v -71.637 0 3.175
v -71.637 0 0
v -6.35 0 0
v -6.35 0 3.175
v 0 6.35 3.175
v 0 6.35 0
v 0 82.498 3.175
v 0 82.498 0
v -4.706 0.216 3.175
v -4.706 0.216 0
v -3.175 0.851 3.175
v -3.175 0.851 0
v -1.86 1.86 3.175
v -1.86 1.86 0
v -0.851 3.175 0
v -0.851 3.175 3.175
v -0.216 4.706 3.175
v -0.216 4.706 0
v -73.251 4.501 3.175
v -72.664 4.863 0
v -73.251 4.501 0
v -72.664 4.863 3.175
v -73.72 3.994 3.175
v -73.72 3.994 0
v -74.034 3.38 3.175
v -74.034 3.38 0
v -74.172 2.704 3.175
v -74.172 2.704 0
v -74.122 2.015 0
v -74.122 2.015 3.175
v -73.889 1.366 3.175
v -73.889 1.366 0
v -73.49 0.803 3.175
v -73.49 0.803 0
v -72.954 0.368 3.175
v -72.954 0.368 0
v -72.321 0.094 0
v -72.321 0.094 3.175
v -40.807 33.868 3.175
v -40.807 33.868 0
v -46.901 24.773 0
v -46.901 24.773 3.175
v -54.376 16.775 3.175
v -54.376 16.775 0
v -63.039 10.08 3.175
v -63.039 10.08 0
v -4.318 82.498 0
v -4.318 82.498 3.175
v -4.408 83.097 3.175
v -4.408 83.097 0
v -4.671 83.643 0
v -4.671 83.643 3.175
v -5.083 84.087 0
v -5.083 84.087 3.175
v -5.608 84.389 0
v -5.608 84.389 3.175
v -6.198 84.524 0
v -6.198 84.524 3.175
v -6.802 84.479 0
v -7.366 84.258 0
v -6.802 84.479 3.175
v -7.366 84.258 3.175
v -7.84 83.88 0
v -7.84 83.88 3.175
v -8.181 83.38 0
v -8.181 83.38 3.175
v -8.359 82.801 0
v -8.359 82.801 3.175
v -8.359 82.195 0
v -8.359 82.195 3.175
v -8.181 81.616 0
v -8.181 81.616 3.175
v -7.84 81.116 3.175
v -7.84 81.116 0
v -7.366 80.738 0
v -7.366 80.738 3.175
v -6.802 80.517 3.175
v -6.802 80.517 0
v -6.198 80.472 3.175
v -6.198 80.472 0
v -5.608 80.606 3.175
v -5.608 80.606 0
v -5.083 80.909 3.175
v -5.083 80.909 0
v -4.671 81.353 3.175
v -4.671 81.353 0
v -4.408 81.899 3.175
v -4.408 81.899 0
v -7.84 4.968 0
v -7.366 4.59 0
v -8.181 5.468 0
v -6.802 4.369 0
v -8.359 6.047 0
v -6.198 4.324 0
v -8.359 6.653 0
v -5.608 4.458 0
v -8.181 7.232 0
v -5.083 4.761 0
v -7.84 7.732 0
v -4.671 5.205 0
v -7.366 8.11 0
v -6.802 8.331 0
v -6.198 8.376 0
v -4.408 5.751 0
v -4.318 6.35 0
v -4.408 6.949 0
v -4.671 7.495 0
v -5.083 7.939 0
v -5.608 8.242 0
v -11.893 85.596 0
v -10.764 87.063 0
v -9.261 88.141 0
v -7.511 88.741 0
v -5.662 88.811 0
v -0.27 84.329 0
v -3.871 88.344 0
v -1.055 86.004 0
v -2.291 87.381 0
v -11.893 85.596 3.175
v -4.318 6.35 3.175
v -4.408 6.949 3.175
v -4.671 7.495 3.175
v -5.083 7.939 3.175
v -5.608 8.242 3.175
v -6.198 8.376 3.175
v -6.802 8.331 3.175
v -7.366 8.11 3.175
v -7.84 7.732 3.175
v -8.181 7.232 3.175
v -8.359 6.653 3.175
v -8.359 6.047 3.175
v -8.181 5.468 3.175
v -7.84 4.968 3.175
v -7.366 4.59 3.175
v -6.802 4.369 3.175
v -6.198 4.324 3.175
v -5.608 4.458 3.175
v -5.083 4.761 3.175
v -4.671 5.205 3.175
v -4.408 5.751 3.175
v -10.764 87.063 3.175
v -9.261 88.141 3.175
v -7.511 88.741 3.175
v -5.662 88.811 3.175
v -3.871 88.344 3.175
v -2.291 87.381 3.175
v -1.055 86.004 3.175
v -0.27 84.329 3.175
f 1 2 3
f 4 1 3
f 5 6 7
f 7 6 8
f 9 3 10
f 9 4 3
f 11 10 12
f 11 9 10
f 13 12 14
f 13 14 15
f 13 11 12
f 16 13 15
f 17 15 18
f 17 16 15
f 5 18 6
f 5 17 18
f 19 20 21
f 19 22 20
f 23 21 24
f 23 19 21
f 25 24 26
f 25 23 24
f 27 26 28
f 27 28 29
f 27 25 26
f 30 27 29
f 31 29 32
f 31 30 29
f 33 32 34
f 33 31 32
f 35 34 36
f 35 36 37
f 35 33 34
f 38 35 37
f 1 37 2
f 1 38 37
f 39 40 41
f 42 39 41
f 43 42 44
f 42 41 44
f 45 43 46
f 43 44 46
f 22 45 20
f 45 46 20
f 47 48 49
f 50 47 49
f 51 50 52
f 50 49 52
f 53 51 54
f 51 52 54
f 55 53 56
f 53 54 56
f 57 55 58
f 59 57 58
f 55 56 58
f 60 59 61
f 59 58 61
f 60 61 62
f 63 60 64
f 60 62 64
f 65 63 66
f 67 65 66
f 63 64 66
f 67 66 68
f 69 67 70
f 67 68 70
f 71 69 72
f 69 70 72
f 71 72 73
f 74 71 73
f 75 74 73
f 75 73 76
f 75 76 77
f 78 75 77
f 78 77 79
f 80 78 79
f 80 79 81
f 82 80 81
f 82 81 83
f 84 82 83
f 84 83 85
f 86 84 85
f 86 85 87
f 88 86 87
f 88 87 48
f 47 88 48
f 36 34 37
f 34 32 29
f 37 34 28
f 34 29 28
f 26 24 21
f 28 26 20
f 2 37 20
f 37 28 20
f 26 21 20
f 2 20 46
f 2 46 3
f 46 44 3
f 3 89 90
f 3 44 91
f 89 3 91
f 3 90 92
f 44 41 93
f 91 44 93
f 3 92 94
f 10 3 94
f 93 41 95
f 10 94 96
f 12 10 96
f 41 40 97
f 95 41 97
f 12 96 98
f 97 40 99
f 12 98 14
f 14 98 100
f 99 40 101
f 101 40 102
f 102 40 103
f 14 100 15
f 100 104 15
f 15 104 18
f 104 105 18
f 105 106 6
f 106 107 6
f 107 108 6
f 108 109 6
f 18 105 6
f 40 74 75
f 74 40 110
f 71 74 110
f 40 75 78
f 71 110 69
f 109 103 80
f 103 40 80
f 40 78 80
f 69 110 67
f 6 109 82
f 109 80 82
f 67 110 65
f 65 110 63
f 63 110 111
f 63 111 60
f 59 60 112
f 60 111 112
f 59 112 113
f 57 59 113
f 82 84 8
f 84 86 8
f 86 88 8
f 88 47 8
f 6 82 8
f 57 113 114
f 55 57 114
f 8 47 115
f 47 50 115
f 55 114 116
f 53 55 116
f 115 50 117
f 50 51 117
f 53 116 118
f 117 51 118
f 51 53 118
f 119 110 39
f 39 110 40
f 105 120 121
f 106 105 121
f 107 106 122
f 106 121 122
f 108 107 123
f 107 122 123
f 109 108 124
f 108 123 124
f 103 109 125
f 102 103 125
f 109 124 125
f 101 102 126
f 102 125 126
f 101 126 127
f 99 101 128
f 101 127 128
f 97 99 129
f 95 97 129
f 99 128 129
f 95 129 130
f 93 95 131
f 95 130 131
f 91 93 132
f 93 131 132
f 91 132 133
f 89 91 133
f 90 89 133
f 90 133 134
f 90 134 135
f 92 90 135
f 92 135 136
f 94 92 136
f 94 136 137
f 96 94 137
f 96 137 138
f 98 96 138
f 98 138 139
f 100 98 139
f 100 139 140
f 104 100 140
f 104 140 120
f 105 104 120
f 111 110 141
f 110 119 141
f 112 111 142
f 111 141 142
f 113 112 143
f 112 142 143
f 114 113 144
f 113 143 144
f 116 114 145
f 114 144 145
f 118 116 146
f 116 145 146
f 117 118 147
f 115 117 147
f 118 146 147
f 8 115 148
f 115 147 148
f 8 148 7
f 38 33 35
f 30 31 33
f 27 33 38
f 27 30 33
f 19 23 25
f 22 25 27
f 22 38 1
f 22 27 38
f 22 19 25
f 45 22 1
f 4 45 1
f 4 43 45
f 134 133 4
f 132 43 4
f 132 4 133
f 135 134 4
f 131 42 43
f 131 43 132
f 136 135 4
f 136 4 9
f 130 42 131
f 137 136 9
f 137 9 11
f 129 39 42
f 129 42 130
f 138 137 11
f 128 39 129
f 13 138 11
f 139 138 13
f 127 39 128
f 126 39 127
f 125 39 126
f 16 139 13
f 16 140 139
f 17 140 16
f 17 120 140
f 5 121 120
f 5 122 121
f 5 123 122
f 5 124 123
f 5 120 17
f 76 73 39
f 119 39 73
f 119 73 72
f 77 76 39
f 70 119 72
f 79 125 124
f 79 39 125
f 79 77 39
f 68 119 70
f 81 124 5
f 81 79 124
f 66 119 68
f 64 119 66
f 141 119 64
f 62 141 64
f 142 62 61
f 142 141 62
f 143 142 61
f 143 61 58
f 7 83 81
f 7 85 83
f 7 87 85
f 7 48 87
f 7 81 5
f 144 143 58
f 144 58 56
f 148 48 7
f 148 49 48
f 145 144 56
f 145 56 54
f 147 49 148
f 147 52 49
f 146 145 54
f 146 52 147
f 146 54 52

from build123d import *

# Parameters (mm, degrees)
BOSS_EXTRUDE1_DEPTH = 3.175
FILLET1_R           = 2.54
FILLET2_R           = 6.35
SKETCH2_R           = 2.032
CUT_EXTRUDE1_DEPTH  = 116.785553087


with BuildPart() as part:
    # Sketch1 → Boss-Extrude1 (new body)
    with BuildSketch(Plane.XY):
        with BuildLine():
            Line((0, 0), (0, 106.872811366))
            Line((0, 106.872811366), (-40.80699964, 33.868121814))
            ThreePointArc((-40.80699964, 33.868121814), (-60.999593642, 11.461483708), (-88.9, 0))
            Line((-88.9, 0), (0, 0))
        make_face()
    extrude(amount=BOSS_EXTRUDE1_DEPTH)

    # Fillet1
    fillet1_edges = [part.edges().sort_by_distance(p)[0] for p in [
        (-88.9, 0, 1.5875),
    ]]
    fillet(fillet1_edges, radius=FILLET1_R)

    # Fillet2
    fillet2_edges = [part.edges().sort_by_distance(p)[0] for p in [
        (0, 106.872811366, 1.5875),
        (0, 0, 1.5875),
    ]]
    fillet(fillet2_edges, radius=FILLET2_R)

    # Sketch2 → Cut-Extrude1 (cut, through all)
    with BuildSketch(Plane.XY.offset(3.175)):
        with Locations((-6.35, 6.35)):
            Circle(SKETCH2_R)
        with Locations((-6.35, 82.497944882)):
            Circle(SKETCH2_R)
    extrude(amount=-CUT_EXTRUDE1_DEPTH, mode=Mode.SUBTRACT)


solid = part.part
